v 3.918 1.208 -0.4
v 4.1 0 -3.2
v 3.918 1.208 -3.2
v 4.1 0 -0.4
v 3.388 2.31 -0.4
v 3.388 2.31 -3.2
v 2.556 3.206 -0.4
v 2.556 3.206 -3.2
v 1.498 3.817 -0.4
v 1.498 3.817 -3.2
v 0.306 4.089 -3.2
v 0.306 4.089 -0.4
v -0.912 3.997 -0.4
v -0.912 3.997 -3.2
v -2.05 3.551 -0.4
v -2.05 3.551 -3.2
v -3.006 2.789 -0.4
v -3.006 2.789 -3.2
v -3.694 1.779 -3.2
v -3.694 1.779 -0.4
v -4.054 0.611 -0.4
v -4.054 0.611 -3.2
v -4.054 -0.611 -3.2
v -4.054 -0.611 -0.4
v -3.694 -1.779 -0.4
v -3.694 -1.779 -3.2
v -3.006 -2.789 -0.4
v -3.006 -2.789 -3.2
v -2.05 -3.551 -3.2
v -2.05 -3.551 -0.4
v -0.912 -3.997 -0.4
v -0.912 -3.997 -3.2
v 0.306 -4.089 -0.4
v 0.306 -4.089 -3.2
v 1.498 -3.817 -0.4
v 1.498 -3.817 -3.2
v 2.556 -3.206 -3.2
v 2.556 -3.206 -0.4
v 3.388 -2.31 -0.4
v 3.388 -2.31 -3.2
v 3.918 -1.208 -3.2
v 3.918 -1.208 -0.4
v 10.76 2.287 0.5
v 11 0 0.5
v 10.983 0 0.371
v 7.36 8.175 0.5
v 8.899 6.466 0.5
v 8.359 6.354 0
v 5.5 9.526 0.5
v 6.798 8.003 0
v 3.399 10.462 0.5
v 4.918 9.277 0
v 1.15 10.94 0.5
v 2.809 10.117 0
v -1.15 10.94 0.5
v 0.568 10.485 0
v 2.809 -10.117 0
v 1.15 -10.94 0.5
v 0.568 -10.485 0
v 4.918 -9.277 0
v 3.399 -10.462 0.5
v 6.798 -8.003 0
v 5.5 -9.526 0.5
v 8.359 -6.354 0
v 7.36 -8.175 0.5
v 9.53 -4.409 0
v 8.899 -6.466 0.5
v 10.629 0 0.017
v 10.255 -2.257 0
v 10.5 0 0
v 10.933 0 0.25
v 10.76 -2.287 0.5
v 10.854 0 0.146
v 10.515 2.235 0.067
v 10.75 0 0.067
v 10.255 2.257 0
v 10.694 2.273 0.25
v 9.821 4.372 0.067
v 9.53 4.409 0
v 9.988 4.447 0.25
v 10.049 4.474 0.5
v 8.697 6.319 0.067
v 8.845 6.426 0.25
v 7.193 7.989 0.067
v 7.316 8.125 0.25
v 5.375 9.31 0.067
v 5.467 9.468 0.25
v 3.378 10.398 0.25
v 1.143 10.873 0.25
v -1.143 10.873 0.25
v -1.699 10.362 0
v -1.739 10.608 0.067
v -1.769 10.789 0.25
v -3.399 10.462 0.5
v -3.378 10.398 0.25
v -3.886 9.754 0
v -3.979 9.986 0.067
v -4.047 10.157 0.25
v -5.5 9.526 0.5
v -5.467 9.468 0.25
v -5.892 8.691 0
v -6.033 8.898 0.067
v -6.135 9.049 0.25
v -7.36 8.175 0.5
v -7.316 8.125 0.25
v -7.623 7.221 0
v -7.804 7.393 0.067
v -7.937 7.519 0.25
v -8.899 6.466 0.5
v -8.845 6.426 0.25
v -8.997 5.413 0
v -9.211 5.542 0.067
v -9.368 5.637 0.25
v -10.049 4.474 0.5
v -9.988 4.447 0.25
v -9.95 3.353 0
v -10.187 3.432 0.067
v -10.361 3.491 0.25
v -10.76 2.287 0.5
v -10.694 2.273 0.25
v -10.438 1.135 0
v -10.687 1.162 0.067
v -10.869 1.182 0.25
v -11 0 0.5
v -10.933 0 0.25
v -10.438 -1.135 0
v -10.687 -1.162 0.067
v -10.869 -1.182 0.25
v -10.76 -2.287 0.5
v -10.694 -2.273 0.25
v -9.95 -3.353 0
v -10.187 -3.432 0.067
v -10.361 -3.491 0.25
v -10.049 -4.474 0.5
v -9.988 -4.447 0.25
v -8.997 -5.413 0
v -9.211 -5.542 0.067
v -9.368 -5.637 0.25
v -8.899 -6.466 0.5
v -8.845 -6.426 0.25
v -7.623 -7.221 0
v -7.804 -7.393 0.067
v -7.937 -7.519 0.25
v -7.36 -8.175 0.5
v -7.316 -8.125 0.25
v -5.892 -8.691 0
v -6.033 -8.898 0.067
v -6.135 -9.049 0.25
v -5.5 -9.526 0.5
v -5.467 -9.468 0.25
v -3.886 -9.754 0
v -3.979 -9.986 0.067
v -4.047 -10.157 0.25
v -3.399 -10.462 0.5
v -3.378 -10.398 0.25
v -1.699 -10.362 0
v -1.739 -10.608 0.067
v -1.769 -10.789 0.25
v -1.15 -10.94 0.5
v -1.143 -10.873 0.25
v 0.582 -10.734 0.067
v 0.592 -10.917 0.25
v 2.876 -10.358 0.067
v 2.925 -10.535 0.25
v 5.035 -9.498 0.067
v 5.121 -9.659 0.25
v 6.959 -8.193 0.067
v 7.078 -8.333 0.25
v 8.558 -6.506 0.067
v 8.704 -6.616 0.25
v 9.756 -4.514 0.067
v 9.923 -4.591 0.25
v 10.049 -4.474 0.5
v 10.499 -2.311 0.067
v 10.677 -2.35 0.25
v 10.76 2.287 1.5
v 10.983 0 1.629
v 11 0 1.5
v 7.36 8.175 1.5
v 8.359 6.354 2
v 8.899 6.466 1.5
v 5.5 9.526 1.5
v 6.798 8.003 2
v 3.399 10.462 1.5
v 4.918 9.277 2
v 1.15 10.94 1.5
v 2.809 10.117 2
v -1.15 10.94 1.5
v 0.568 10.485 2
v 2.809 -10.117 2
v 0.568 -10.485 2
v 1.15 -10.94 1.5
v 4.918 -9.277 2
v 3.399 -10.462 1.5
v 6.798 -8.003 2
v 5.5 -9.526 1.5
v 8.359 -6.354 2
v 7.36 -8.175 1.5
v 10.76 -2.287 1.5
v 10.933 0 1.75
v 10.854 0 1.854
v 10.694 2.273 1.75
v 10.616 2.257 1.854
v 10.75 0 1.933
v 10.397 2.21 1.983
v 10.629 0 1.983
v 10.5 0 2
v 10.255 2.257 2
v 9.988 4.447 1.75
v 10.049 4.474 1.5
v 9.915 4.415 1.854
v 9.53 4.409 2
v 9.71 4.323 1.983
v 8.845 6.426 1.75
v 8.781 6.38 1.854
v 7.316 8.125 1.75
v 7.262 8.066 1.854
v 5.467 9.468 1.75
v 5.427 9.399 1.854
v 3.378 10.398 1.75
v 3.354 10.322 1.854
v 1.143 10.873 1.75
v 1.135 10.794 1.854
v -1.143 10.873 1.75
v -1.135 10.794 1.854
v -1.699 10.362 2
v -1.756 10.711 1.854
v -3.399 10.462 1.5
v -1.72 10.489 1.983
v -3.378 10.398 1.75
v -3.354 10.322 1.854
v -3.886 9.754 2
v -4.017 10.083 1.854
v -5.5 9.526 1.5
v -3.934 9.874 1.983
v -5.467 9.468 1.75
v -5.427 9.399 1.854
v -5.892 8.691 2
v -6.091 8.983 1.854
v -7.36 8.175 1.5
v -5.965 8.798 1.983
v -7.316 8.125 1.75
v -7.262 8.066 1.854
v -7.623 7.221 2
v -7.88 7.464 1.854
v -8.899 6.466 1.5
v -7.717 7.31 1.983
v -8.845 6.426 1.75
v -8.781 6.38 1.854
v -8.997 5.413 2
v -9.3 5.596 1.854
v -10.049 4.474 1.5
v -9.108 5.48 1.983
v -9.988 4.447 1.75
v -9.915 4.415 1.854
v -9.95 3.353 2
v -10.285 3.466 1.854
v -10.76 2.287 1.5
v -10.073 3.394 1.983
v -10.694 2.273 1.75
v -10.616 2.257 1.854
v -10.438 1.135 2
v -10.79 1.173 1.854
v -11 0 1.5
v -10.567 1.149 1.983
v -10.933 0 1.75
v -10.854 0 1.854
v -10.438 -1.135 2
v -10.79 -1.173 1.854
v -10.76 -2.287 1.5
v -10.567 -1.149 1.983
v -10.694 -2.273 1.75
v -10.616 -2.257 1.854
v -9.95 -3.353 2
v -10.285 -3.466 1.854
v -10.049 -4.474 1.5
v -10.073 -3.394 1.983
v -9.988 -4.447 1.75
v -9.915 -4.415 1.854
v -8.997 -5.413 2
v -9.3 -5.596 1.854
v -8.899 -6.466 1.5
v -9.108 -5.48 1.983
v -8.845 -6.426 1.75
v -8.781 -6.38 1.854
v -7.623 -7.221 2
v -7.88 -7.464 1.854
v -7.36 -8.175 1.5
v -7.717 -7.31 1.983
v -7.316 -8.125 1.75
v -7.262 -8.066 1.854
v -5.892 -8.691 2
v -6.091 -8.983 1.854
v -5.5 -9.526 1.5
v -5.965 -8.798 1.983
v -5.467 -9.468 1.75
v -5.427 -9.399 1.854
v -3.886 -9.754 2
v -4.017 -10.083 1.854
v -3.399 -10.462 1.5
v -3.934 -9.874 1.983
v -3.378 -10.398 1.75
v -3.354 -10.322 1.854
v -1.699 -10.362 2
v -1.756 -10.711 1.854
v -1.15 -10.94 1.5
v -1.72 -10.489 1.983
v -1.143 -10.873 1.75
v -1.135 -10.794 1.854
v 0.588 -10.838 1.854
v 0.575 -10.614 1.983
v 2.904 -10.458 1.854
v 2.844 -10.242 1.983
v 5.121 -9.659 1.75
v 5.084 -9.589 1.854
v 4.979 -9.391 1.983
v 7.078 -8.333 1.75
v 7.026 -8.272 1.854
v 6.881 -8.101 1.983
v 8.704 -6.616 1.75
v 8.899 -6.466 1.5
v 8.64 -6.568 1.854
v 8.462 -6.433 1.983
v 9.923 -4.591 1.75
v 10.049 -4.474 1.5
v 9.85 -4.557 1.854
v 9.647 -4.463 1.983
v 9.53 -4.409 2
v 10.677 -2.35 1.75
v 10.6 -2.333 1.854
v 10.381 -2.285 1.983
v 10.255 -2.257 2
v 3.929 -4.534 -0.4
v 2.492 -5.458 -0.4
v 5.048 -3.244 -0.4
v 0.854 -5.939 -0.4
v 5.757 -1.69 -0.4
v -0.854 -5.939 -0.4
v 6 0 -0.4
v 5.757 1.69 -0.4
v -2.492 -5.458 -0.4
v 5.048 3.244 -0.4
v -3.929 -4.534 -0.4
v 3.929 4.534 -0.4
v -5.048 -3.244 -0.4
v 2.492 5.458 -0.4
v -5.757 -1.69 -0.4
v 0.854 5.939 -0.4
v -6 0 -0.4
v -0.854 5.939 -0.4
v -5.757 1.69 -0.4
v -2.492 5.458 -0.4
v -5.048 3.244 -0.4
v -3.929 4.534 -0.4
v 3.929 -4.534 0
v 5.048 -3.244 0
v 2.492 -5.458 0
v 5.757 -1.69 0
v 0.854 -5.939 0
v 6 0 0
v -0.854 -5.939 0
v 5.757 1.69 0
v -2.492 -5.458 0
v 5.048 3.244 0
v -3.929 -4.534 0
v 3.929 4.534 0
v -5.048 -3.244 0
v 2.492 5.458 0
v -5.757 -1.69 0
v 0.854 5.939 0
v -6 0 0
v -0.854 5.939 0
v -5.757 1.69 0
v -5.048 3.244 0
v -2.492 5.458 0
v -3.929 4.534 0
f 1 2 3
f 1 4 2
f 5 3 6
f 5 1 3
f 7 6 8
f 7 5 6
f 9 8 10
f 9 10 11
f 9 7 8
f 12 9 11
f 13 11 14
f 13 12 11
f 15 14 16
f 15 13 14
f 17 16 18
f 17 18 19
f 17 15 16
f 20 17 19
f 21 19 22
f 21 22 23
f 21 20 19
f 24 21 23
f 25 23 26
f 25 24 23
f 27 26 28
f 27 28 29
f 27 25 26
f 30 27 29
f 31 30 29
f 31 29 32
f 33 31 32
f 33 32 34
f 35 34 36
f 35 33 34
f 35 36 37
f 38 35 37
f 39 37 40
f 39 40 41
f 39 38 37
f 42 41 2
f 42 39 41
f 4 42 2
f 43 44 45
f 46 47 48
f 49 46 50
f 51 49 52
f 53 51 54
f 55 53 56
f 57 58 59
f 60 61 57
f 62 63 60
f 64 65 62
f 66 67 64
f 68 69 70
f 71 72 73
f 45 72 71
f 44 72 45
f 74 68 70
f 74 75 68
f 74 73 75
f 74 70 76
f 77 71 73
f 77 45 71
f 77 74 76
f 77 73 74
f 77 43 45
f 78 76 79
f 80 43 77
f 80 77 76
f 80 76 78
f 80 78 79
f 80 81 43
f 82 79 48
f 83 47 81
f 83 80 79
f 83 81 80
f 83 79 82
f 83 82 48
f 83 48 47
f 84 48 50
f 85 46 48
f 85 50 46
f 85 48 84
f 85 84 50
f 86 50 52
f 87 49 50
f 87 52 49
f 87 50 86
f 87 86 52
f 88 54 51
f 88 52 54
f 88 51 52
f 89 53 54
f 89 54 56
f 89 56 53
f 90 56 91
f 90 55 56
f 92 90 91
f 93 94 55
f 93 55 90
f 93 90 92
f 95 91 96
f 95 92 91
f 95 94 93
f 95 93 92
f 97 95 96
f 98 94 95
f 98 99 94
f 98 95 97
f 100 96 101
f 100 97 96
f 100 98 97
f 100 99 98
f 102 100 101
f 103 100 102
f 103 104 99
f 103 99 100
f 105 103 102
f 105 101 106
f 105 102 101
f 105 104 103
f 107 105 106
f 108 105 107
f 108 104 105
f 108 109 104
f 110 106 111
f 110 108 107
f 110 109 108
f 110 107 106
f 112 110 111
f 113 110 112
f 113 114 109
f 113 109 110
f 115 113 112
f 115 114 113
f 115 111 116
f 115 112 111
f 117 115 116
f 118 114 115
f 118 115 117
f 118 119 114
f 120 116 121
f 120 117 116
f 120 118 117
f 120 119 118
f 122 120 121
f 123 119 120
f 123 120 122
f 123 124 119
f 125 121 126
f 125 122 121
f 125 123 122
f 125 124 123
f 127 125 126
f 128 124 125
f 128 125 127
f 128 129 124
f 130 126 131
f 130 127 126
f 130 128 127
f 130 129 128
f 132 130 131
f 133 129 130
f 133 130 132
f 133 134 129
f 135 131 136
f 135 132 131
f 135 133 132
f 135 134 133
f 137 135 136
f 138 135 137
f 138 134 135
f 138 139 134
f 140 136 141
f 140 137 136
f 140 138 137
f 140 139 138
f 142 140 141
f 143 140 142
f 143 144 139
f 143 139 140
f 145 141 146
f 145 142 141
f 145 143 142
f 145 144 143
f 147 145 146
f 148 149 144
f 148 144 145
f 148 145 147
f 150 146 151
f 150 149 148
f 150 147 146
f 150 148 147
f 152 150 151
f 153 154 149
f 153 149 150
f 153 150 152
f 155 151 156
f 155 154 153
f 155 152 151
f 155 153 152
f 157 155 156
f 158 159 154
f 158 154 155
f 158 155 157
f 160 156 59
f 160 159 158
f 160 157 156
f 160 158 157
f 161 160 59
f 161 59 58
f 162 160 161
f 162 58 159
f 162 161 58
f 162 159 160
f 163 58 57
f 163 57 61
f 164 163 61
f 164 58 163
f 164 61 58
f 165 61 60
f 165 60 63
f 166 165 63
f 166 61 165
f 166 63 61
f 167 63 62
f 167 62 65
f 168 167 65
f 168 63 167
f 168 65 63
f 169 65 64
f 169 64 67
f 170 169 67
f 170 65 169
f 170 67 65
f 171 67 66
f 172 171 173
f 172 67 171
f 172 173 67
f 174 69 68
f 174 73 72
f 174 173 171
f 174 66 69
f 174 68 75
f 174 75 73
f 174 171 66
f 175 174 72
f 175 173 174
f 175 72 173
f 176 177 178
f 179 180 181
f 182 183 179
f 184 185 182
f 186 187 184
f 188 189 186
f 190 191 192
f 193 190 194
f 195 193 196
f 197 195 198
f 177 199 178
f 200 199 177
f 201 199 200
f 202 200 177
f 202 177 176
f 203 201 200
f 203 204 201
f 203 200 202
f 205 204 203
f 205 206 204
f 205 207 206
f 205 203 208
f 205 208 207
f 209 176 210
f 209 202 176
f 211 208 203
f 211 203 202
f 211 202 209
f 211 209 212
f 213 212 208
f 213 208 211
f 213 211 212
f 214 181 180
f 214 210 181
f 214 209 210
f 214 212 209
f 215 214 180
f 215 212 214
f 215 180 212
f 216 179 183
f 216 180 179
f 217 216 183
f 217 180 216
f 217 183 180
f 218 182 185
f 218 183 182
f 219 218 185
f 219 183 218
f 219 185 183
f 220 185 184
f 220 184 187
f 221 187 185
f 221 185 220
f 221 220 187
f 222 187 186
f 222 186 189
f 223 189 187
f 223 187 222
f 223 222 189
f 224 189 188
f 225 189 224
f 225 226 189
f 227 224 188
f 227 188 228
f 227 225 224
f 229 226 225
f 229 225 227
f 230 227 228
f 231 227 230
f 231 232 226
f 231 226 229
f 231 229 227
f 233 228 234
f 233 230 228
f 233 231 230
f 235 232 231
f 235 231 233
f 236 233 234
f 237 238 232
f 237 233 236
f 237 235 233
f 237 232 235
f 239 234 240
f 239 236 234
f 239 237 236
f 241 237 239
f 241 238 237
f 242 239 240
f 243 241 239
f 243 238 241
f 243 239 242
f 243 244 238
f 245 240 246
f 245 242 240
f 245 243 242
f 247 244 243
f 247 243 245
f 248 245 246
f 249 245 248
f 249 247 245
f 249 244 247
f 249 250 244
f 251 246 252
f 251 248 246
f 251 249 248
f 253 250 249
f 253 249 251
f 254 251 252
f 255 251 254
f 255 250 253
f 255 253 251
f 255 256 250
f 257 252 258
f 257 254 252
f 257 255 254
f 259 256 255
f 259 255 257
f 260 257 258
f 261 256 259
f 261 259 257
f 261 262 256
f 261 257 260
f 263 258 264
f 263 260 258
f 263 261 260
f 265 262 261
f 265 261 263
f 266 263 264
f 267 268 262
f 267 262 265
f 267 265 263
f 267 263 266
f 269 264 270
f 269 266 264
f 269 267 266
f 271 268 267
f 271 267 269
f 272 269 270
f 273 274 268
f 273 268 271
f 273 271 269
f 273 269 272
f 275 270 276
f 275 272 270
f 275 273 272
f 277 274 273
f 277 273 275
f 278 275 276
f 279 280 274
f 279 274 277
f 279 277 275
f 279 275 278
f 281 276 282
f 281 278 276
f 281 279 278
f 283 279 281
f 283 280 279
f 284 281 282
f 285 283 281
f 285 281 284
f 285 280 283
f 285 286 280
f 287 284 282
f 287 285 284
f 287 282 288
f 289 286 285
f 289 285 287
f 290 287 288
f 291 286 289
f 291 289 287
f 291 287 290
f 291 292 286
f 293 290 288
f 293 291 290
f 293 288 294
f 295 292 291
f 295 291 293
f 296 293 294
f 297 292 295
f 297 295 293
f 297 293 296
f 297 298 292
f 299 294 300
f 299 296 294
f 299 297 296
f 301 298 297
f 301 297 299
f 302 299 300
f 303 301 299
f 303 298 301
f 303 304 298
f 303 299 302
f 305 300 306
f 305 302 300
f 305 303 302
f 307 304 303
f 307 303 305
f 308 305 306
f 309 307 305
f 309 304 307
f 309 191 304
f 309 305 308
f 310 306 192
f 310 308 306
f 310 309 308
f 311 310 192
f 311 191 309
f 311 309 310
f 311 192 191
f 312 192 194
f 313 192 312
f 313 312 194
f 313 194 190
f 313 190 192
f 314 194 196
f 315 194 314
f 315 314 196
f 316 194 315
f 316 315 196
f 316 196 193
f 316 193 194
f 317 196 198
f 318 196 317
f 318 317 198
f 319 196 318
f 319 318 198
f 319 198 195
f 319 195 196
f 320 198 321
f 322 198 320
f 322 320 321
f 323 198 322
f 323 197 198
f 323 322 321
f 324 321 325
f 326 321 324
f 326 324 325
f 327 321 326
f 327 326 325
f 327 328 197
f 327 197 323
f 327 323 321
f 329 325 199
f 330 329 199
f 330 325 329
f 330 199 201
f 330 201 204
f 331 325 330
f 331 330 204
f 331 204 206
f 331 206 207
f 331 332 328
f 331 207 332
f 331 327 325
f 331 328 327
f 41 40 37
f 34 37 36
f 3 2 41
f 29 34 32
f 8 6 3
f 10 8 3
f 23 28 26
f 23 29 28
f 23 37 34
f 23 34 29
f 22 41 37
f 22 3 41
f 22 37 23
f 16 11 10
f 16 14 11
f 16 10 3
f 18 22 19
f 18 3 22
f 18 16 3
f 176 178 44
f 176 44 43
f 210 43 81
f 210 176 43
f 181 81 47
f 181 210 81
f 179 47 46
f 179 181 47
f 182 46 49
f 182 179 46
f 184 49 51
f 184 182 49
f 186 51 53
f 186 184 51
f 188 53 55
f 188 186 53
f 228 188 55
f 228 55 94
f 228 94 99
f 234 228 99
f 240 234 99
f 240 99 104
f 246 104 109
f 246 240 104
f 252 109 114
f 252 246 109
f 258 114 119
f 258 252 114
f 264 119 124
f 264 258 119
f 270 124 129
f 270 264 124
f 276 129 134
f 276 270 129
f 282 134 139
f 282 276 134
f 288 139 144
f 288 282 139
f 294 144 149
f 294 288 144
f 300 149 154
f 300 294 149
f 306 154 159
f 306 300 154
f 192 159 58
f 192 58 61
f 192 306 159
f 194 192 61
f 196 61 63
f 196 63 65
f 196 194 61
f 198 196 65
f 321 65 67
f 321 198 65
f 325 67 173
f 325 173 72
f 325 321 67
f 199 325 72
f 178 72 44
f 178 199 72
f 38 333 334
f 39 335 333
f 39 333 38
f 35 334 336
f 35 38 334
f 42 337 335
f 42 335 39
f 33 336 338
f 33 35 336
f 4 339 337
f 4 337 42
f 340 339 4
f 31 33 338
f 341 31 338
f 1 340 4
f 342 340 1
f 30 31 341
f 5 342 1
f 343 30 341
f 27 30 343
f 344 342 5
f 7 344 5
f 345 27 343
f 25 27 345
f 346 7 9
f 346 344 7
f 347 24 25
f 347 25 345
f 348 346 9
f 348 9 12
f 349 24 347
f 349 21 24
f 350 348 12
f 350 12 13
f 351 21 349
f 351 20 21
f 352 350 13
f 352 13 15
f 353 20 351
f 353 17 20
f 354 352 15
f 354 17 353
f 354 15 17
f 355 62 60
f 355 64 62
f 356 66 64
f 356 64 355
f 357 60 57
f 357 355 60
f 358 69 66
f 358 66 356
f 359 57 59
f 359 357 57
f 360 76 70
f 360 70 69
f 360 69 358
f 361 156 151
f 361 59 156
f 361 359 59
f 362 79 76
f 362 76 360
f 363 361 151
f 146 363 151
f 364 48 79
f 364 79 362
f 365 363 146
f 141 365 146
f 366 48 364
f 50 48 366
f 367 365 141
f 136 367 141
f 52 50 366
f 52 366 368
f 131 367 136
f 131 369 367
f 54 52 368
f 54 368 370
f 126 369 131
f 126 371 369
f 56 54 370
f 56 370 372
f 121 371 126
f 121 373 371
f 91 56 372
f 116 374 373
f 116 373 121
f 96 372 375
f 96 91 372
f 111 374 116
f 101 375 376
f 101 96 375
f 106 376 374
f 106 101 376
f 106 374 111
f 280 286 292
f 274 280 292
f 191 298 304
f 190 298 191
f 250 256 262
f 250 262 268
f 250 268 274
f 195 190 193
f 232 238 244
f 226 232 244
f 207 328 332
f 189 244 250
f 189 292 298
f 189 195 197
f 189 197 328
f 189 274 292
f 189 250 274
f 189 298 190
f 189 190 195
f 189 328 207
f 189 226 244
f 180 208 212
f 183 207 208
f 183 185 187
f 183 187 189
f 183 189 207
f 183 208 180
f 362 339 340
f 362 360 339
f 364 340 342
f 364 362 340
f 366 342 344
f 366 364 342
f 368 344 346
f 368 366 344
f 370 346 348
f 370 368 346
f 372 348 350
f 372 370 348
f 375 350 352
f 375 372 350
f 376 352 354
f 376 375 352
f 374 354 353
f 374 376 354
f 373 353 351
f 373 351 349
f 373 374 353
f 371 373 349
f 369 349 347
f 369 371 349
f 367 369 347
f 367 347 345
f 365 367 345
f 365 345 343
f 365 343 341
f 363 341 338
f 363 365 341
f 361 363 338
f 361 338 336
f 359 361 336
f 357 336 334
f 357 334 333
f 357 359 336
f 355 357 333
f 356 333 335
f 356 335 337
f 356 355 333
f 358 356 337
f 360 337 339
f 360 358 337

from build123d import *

# Parameters (mm, degrees)
F0_W   = 4.1
F0_H   = 0.4
F0_W_2 = 1.9
F0_H_2 = 2.8
F2_R   = 0.5


with BuildPart() as f1:
    # F0 (on Front) → F1 (revolve)
    with BuildSketch(Plane.XZ):
        Polygon((0, 2), (0, 0), (4.1, 0), (6, 0), (11, 0), (11, 2), align=None)
        with Locations((2.05, -0.2)):
            Rectangle(F0_W, F0_H)
        with Locations((5.05, -0.2)):
            Rectangle(F0_W_2, F0_H)
        with Locations((2.05, -1.8)):
            Rectangle(F0_W, F0_H_2)
    revolve(axis=Axis((0, 0, 1), (0, 0, 1)))

    # F2
    f2_edges = [f1.edges().sort_by_distance(p)[0] for p in [
        (-11, 0, 0),
        (-11, 0, 2),
    ]]
    fillet(f2_edges, radius=F2_R)


solid = f1.part
